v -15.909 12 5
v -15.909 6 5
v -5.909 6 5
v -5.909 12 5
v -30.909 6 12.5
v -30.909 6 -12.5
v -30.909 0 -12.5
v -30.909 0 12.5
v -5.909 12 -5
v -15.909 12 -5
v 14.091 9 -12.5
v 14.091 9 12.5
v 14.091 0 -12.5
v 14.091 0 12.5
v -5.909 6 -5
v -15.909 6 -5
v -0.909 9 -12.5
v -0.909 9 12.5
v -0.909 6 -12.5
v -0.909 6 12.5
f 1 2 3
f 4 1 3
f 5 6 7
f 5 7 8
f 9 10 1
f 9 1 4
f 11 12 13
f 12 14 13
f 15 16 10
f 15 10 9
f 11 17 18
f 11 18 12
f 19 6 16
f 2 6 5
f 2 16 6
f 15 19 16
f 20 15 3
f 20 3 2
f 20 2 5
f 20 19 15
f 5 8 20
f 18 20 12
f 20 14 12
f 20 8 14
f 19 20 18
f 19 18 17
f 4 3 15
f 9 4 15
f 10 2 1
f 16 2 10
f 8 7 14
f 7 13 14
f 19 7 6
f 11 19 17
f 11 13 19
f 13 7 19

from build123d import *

# Parameters (mm, degrees)
SKETCH6_W           = 30
SKETCH6_H           = 25
BOSS_EXTRUDE6_DEPTH = 6
SKETCH7_W           = 15
SKETCH7_H           = 25
BOSS_EXTRUDE7_DEPTH = 3
SKETCH8_W           = 10
SKETCH8_H           = 10
BOSS_EXTRUDE8_DEPTH = 6
SKETCH9_W           = 25
SKETCH9_H           = 6
BOSS_EXTRUDE9_DEPTH = 15


with BuildPart() as part:
    # Sketch6 → Boss-Extrude6 (new body)
    with BuildSketch(Plane(origin=(0, 0, 0), x_dir=(1, 0, 0), z_dir=(0, 1, 0))):
        with Locations((-0.909090909, 0)):
            Rectangle(SKETCH6_W, SKETCH6_H)
    extrude(amount=BOSS_EXTRUDE6_DEPTH)

    # Sketch7 → Boss-Extrude7 (add)
    with BuildSketch(Plane(origin=(0, 6, 0), x_dir=(1, 0, 0), z_dir=(0, 1, 0))):
        with Locations((6.590909091, 0)):
            Rectangle(SKETCH7_W, SKETCH7_H)
    extrude(amount=BOSS_EXTRUDE7_DEPTH)

    # Sketch8 → Boss-Extrude8 (add)
    with BuildSketch(Plane(origin=(0, 6, 0), x_dir=(1, 0, 0), z_dir=(0, 1, 0))):
        with Locations((-10.909090909, 0)):
            Rectangle(SKETCH8_W, SKETCH8_H)
    extrude(amount=BOSS_EXTRUDE8_DEPTH)

    # Sketch9 → Boss-Extrude9 (add)
    with BuildSketch(Plane.ZY.offset(15.909090909)):
        with Locations((0, 3)):
            Rectangle(SKETCH9_W, SKETCH9_H)
    extrude(amount=BOSS_EXTRUDE9_DEPTH)


solid = part.part
